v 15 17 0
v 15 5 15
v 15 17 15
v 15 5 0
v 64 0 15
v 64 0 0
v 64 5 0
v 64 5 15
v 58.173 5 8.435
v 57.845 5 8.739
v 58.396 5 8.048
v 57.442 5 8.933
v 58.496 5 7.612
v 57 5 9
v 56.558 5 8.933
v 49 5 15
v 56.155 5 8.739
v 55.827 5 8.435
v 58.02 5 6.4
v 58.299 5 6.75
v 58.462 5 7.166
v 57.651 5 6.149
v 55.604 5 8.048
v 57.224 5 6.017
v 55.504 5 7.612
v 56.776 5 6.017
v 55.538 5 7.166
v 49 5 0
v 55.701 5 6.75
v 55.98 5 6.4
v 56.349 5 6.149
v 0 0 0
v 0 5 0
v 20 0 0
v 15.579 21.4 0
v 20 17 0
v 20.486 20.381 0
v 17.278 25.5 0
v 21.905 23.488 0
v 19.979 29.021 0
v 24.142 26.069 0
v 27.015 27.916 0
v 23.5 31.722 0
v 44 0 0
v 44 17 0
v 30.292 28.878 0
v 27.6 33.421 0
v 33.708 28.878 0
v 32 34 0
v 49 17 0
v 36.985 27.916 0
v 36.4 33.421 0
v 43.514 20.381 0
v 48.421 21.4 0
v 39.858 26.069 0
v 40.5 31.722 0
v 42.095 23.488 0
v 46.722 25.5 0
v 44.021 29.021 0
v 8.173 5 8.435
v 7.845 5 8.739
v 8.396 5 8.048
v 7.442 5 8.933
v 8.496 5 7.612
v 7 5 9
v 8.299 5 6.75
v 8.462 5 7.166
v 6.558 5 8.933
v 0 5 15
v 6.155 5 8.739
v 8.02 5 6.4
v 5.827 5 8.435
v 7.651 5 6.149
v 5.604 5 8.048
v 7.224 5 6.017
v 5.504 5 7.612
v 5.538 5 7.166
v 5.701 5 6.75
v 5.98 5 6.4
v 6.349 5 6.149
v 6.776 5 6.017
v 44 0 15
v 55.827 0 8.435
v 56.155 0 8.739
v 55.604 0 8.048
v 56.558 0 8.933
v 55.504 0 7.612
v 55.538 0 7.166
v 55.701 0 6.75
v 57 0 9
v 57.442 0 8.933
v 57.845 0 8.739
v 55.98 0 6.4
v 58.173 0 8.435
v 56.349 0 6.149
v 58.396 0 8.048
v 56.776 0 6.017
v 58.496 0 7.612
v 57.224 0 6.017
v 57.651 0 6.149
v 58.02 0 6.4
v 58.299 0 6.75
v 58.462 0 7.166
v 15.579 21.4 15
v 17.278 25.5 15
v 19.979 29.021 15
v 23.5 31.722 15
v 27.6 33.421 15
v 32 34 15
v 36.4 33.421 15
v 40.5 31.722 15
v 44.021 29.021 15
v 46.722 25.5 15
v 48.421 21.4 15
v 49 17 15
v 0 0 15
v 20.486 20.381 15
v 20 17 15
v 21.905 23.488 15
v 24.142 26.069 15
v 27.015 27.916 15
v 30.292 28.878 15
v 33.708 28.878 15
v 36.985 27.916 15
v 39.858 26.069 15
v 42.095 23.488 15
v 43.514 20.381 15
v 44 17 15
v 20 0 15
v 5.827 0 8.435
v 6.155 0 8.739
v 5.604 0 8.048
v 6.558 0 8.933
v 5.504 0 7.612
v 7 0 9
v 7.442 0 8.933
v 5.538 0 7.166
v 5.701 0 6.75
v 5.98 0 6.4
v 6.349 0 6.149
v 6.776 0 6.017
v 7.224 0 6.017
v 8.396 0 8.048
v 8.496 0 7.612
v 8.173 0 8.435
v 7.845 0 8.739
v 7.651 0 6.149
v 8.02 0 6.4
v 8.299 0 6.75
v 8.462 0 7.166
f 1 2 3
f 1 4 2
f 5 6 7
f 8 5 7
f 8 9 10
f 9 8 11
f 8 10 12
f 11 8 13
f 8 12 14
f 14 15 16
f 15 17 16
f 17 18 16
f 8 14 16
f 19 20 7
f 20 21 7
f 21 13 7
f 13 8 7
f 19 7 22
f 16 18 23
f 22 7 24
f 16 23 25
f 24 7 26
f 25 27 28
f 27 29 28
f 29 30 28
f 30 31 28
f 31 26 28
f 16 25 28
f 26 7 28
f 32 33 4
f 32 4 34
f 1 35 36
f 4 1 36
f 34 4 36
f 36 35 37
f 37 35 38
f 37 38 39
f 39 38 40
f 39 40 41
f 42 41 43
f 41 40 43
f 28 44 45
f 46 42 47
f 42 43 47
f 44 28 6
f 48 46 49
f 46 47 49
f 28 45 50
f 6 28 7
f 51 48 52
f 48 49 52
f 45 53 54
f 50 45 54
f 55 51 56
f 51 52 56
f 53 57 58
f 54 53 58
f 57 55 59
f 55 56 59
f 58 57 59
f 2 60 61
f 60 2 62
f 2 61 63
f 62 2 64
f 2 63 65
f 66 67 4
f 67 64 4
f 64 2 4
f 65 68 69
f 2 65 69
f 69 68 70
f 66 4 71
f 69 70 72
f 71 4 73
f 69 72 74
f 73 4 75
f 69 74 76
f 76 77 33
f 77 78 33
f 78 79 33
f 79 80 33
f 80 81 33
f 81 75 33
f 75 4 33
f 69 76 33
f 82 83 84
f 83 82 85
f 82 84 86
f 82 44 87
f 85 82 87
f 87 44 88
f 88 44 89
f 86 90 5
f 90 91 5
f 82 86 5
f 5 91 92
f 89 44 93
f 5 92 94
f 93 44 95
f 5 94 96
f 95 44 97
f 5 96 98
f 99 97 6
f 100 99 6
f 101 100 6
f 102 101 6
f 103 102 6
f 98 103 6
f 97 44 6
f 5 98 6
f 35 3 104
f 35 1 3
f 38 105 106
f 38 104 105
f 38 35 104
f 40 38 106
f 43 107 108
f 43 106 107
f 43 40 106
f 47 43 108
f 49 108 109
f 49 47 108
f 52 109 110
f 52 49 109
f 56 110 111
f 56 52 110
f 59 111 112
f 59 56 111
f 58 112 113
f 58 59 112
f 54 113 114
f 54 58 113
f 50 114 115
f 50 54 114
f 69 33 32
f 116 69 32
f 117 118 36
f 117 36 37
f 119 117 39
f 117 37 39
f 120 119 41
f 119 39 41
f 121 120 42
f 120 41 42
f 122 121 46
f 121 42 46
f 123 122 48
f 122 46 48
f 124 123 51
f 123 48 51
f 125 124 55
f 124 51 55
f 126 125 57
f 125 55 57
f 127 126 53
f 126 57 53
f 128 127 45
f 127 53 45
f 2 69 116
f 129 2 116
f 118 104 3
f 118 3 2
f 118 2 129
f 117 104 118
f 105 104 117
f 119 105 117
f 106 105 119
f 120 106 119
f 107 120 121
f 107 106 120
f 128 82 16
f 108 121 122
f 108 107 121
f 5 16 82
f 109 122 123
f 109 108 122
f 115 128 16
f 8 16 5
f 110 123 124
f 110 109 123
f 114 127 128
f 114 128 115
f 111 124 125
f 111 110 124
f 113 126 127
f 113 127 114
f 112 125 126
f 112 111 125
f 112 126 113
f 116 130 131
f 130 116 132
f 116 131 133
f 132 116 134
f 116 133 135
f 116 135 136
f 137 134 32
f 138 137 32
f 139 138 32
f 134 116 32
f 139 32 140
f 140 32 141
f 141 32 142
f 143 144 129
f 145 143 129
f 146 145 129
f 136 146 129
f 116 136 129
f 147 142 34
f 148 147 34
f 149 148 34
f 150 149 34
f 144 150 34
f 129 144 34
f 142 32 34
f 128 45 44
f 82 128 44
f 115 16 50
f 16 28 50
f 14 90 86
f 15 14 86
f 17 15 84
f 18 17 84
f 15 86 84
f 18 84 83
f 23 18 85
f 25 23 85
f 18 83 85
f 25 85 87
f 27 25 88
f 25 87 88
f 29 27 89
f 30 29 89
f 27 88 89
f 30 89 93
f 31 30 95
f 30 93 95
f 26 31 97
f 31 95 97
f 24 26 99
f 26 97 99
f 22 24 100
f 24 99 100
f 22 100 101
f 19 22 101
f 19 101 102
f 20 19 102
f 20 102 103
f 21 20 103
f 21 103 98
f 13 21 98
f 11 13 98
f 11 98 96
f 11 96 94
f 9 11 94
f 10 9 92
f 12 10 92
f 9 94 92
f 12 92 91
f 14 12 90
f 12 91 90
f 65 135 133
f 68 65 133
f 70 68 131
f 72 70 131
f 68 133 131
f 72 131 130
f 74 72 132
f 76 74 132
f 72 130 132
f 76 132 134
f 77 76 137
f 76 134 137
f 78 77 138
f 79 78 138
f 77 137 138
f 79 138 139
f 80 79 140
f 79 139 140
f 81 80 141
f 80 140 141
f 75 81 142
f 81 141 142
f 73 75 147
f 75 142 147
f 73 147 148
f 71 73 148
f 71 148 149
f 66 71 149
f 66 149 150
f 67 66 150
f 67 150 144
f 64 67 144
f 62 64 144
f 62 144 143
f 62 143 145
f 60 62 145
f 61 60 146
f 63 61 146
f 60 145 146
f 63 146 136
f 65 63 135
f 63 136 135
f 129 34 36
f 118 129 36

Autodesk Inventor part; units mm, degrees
ref_plane "YZ Plane" through (0, 0, 0) normal (1, 0, 0) x (0, 1, 0)
ref_plane "XZ Plane" through (0, 0, 0) normal (0, 1, 0) x (-1, 0, 0)
ref_plane "XY Plane" through (0, 0, 0) normal (0, 0, 1) x (1, 0, 0)
sketch "Sketch1" plane through (0, 0, 0) normal (0, 0, 1) x (1, 0, 0)
  line L0 (64, 0) -> (64, 5)
  line L1 (0, 5) -> (0, 0)
  arc A0 (49, 17) -> (15, 17) centre (32, 17) ccw
  line L2 (15, 5) -> (15, 17)
  line L3 (49, 5) -> (49, 17)
  line L4 (20, 0) -> (20, 17)
  arc A1 (44, 17) -> (20, 17) centre (32, 17) ccw
  line L5 (44, 17) -> (44, 0)
  line L6 (64, 5) -> (49, 5)
  line L7 (15, 5) -> (0, 5)
  line L8 (0, 0) -> (20, 0)
  line L9 (44, 0) -> (64, 0)
  dimension "d1" = 5
  dimension "d3" = 17
  dimension "d4" = 15
  dimension "d6" = 5
  dimension "d7" = 15
  dimension "d8" = 20
extrude "Extrusion1" add sketch "Sketch1" along normal blind 15
sketch "Sketch2" plane through (0, 5, 0) normal (0, 1, 0) x (1, 0, 0)
  line L0 (15, 0) -> (0, 0) projected
  line L1 (64, 0) -> (49, 0) projected
  line L2 (0, 0) -> (0, -15) projected
  point P0 (7, -7.5)
  point P1 (57, -7.5)
  dimension "d18" = 50
  dimension "d19" = 7.5
  dimension "d20" = 7.5
  dimension "d21" = 7
hole "Hole1" at (7, 5, 7.5) at (57, 5, 7.5) direction (0, -1, 0) diameter 3 end through all
properties part number "U_BRACKET_2"
